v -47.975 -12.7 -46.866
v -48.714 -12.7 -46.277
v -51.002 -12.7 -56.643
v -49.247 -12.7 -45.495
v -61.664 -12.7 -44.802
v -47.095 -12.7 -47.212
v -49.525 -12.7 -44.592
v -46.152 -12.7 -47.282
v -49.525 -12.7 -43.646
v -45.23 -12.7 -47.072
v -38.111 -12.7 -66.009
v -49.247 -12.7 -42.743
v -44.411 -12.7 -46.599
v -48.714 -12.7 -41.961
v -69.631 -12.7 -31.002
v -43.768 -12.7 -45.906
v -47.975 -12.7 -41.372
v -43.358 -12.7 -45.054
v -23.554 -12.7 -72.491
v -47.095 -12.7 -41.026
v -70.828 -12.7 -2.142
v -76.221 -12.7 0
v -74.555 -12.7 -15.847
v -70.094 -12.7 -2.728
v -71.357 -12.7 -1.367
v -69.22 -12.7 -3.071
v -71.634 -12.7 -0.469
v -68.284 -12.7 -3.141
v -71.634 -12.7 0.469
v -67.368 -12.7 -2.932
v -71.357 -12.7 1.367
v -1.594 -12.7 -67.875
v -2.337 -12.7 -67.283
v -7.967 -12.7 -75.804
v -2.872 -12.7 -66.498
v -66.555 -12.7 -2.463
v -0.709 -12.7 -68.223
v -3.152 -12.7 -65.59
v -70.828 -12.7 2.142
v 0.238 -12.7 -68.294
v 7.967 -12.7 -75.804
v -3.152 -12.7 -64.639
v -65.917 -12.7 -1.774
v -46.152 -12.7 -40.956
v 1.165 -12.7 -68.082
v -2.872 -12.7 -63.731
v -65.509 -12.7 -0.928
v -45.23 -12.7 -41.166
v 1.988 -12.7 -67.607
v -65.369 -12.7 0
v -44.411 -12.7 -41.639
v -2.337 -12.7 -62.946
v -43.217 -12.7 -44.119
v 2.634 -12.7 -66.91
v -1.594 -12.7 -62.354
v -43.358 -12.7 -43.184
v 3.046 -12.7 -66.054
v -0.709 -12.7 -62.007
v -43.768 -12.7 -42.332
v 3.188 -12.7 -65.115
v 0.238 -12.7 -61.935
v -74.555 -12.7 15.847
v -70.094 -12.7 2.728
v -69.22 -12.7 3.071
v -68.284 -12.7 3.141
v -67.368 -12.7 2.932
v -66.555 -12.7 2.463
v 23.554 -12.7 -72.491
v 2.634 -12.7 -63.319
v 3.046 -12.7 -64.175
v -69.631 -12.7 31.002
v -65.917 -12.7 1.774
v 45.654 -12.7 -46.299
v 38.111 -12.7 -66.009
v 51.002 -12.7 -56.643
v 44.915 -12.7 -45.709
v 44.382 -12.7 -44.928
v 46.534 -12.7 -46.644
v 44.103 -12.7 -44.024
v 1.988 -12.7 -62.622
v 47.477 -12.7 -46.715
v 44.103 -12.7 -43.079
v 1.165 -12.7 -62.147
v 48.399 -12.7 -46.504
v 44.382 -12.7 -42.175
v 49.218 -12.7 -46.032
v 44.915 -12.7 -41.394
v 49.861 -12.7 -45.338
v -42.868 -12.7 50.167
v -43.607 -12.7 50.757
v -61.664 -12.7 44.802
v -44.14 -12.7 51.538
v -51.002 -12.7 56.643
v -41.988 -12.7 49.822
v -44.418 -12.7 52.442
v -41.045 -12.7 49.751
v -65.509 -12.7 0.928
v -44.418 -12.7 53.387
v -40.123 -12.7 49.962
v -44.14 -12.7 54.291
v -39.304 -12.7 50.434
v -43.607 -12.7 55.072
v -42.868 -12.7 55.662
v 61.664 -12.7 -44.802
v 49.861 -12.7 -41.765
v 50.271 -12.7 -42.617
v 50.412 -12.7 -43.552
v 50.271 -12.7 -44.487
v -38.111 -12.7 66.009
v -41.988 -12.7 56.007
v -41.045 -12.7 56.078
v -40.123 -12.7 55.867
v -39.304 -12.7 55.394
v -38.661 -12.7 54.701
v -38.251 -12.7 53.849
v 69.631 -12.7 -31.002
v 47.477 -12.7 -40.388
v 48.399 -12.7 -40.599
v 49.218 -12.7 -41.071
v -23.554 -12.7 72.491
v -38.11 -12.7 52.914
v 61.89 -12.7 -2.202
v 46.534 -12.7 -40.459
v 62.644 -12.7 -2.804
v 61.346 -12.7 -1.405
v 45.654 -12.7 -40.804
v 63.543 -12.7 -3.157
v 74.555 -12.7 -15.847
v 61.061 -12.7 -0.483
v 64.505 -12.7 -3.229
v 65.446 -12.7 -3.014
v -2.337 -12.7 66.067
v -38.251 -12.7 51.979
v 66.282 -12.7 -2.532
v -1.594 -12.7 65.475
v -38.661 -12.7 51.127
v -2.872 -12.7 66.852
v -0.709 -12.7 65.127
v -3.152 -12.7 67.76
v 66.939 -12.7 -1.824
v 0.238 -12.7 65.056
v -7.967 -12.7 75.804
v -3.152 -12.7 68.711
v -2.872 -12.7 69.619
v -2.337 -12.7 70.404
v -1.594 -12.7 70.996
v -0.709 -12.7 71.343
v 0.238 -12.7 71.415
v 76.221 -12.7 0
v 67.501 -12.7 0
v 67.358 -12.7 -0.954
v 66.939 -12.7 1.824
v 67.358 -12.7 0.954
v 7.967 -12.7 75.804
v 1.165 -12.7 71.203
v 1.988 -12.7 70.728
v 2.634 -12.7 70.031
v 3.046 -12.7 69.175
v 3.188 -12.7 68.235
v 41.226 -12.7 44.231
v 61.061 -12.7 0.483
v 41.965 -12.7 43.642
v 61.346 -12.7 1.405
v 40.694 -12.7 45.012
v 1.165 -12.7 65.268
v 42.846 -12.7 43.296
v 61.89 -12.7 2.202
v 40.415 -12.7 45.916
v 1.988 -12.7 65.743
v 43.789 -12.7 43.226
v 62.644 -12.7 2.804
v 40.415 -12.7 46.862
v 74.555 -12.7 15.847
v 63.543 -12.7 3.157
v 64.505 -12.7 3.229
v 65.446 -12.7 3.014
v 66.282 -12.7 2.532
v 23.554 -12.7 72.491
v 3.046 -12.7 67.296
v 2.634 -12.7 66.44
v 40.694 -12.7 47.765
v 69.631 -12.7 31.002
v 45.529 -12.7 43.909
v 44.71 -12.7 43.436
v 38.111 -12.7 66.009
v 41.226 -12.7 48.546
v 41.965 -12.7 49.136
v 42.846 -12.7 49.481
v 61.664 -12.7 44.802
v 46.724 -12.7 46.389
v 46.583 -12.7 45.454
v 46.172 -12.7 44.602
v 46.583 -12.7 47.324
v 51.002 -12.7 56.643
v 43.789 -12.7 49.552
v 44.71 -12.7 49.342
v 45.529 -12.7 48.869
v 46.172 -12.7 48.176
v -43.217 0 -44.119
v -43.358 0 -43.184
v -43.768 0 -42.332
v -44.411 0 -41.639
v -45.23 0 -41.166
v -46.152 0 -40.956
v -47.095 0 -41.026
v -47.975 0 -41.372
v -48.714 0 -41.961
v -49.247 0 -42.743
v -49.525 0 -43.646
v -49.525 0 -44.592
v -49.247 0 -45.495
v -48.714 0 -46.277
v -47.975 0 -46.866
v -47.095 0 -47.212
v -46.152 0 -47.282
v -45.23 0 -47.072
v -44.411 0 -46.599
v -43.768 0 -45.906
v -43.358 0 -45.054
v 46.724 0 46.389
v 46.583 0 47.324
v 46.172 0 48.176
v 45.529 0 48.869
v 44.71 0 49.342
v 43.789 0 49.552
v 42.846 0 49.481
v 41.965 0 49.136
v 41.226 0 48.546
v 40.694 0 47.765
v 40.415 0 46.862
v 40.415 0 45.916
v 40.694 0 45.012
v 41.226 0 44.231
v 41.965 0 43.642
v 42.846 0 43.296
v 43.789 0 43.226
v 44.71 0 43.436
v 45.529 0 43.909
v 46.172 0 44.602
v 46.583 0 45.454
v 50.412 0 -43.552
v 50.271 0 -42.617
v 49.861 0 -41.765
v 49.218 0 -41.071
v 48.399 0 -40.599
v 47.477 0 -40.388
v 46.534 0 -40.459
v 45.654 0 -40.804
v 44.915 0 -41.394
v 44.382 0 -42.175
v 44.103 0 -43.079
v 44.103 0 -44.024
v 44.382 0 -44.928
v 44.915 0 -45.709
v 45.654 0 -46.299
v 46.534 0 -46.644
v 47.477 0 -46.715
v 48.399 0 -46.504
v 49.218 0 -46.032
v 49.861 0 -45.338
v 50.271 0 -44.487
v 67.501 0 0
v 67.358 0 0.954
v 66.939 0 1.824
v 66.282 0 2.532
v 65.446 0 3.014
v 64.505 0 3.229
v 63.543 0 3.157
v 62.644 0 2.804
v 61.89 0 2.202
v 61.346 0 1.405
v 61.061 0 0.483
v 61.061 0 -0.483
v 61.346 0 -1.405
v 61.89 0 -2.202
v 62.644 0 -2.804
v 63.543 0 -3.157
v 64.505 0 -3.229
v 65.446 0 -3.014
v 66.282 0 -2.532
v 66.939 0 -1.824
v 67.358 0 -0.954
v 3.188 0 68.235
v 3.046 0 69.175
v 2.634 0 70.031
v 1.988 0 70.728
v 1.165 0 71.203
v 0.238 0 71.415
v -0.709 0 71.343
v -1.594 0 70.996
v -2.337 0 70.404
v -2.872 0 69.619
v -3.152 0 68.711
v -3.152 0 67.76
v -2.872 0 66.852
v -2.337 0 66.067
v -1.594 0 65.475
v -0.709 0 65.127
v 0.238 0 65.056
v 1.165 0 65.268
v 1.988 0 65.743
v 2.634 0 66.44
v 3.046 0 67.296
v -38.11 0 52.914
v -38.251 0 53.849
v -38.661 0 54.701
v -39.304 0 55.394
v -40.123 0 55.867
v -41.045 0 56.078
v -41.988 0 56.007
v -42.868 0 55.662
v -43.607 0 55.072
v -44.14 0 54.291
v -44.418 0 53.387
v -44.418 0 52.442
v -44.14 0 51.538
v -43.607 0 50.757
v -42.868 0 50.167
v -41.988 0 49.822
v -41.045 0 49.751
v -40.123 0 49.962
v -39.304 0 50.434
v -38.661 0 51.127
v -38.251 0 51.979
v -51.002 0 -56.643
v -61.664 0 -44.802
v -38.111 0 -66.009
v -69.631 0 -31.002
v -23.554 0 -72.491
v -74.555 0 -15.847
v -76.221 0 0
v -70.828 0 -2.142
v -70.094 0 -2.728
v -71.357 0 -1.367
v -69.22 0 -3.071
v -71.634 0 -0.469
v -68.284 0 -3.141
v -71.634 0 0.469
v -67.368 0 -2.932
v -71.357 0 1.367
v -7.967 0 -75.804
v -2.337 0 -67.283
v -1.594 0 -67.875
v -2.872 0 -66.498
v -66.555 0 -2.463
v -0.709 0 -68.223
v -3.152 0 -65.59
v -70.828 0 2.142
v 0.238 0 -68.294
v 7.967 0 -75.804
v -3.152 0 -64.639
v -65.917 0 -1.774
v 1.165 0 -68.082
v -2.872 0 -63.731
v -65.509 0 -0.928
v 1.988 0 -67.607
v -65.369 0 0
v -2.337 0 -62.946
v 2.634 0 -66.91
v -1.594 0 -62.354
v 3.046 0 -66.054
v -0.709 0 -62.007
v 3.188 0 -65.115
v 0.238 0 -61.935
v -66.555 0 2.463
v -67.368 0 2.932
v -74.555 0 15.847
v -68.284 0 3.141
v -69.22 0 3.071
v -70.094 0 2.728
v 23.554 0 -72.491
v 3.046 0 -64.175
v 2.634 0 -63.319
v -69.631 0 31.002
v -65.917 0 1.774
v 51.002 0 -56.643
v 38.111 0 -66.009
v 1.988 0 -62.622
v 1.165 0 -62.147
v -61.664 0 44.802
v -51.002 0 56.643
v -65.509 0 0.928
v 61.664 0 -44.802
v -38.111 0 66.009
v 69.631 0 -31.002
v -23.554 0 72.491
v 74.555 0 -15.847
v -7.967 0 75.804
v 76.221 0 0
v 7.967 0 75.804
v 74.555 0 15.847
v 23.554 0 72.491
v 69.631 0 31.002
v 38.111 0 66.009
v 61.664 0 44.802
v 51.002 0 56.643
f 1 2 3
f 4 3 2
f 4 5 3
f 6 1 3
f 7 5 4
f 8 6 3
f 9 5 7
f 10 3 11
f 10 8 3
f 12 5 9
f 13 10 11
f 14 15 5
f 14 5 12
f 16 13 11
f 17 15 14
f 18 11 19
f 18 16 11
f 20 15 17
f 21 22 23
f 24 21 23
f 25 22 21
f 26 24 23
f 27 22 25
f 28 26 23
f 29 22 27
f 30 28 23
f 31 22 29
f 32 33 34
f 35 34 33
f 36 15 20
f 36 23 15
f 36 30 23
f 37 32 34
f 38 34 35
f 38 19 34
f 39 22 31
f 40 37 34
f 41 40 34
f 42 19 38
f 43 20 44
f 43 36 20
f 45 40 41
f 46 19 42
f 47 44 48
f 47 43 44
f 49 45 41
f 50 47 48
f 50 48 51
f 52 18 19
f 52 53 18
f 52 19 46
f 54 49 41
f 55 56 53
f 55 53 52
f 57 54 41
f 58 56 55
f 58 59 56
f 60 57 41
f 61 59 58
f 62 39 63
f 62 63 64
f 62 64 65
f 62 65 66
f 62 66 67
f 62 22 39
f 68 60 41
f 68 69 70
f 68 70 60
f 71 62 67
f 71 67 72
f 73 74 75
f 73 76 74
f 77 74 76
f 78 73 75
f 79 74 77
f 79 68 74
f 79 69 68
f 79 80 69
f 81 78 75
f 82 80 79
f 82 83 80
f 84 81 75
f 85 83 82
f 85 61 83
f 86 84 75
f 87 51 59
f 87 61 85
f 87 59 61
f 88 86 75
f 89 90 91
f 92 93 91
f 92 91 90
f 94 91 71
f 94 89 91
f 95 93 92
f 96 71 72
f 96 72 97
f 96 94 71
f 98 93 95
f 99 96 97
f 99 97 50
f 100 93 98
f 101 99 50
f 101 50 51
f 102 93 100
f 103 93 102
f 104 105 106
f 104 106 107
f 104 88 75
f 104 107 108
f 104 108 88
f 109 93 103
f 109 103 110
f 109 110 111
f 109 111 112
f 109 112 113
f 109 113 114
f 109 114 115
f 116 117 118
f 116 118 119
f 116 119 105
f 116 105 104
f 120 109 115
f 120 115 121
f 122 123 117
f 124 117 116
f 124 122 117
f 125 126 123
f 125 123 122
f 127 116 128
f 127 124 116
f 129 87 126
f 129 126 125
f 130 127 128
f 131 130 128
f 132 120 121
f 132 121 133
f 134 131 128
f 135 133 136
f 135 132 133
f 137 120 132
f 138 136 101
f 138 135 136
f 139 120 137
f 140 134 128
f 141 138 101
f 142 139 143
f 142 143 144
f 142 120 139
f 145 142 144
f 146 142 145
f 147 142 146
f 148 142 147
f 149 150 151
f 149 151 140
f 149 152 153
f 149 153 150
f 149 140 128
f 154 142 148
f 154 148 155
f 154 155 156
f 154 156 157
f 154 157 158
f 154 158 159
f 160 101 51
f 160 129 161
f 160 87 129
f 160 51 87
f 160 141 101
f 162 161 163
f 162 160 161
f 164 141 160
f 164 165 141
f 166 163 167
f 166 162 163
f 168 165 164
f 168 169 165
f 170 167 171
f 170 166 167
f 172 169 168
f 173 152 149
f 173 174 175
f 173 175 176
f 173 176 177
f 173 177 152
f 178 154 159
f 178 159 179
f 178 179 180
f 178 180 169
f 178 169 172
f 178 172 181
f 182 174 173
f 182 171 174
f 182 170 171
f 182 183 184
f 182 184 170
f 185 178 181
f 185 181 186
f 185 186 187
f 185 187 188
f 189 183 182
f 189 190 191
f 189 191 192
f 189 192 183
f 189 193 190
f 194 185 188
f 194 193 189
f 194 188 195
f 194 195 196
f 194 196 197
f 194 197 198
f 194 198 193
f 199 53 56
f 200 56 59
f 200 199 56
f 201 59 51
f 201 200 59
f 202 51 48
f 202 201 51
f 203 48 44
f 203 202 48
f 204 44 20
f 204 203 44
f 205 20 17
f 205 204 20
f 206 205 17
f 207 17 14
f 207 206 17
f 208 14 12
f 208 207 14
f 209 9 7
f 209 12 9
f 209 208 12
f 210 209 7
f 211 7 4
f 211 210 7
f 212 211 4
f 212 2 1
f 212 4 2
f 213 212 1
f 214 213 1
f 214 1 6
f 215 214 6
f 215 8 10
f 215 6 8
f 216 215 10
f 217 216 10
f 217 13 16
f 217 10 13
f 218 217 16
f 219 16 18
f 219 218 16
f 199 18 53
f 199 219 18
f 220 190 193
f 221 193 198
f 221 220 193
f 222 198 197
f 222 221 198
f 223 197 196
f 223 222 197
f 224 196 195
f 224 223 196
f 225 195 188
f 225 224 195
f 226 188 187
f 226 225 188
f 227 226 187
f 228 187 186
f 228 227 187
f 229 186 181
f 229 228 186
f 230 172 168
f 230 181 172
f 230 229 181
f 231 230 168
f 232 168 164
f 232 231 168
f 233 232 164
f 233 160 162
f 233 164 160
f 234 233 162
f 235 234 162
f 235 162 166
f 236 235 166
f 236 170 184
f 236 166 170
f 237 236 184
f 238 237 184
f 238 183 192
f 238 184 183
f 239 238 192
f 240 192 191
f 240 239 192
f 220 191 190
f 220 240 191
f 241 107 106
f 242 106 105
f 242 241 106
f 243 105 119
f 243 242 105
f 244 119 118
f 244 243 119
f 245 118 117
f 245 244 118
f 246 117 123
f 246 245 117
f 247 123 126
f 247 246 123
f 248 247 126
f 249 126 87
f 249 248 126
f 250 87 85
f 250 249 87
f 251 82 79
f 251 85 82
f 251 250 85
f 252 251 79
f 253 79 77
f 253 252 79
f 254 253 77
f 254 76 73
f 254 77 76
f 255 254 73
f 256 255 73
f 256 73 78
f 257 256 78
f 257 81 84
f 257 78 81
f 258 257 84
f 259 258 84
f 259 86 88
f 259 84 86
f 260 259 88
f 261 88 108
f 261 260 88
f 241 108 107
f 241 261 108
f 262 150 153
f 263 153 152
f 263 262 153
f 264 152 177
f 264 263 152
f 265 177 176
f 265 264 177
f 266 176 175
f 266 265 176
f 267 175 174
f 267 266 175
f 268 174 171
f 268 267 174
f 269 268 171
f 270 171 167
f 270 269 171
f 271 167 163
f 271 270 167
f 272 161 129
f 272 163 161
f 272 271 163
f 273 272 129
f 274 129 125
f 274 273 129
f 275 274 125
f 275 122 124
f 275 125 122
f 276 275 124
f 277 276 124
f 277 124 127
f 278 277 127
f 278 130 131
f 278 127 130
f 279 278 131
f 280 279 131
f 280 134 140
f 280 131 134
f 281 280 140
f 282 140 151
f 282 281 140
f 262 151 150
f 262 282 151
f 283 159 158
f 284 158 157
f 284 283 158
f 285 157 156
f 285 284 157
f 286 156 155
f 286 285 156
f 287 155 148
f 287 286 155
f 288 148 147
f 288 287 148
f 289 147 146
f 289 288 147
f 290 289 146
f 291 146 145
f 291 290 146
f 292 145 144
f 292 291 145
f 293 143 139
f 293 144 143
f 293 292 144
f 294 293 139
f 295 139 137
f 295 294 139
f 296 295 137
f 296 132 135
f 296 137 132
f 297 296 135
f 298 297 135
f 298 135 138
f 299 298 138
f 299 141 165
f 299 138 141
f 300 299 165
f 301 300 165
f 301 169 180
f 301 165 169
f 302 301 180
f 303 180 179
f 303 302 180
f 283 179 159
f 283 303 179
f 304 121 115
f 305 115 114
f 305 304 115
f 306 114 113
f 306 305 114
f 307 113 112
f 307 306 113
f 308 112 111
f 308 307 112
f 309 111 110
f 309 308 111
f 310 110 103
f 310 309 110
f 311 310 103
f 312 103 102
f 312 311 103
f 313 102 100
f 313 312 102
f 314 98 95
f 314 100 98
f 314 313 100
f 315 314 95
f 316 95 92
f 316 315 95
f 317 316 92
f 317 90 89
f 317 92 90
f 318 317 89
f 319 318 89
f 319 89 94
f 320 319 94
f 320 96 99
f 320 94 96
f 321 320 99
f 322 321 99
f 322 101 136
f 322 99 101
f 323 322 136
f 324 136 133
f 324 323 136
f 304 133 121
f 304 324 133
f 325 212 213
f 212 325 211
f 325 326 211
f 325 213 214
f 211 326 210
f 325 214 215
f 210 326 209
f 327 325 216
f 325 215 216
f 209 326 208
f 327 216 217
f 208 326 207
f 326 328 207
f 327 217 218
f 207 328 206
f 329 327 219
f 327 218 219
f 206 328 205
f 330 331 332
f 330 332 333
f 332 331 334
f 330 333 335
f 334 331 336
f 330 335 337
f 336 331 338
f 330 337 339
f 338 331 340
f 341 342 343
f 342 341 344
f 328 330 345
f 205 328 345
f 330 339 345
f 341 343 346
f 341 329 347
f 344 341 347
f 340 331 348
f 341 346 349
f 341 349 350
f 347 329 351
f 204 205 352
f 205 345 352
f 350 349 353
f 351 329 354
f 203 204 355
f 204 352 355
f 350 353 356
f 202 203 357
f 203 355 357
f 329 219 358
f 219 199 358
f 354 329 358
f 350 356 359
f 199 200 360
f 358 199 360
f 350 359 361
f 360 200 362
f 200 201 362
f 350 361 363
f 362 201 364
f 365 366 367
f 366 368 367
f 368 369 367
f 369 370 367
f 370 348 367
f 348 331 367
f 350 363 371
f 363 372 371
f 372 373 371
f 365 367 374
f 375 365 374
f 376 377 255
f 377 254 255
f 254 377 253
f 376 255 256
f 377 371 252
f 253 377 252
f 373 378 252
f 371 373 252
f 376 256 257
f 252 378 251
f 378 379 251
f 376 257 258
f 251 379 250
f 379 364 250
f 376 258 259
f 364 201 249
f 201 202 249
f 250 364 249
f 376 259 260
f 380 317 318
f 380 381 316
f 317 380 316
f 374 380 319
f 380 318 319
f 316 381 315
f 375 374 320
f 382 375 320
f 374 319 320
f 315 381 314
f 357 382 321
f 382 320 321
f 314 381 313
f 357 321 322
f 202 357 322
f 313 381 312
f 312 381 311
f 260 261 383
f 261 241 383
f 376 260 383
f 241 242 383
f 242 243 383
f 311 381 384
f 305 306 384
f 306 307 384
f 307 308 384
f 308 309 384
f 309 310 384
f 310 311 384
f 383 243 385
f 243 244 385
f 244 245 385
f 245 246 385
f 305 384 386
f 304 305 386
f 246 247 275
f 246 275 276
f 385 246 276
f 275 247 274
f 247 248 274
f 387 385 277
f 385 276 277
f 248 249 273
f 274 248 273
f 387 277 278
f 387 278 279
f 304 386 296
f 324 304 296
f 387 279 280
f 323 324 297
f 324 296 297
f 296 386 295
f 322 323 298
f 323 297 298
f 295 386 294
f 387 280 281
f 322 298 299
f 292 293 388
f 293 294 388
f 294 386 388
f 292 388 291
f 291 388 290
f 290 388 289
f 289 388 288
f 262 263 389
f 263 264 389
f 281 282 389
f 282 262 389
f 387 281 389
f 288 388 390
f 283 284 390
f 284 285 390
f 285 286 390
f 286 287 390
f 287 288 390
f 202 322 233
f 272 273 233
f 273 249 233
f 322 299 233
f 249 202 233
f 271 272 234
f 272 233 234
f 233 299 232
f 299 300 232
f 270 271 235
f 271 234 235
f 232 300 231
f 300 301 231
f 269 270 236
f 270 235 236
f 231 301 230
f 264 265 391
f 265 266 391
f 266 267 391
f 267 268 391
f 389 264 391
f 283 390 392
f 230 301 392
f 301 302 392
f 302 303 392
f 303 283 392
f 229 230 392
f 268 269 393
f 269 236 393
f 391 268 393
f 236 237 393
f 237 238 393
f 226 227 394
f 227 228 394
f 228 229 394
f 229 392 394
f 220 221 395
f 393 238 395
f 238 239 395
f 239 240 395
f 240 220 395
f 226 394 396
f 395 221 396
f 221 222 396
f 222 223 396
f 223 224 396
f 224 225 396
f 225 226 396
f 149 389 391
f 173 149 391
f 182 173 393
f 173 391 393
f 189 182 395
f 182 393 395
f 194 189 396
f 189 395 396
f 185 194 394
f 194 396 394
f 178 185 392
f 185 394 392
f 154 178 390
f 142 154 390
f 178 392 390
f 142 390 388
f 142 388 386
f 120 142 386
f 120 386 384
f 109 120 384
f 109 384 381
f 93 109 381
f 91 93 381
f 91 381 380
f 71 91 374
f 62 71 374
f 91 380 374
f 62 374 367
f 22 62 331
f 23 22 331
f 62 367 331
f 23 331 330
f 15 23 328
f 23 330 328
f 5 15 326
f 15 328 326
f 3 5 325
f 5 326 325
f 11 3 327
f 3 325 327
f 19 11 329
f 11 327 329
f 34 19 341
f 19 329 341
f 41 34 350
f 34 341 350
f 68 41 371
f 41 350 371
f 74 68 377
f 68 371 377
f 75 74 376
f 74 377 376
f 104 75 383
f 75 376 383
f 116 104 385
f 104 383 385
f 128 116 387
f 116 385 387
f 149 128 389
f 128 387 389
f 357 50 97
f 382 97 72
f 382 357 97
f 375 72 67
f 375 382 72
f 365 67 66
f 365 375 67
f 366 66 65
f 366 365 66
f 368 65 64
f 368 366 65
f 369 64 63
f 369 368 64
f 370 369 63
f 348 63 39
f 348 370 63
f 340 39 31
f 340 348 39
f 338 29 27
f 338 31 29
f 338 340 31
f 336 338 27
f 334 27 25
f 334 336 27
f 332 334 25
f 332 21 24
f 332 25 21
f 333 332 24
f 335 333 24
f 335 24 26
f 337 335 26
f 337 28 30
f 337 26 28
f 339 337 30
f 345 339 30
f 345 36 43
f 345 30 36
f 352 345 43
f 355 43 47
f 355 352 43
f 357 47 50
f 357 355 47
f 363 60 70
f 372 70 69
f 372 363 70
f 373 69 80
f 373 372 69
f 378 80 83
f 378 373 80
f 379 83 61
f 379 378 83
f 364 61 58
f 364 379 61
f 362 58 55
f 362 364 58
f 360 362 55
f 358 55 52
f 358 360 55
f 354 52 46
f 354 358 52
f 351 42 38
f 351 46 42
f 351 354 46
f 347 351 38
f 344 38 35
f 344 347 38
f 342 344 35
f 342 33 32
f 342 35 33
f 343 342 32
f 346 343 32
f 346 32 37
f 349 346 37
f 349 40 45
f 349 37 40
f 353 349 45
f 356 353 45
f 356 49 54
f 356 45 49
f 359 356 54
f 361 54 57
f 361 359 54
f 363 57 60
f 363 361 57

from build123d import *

# Parameters (mm, degrees)
F0_R     = 76.2210632732
F1_DEPTH = 12.7
F2_R     = 3.1879491609
F2_R_2   = 3.1879465914
F2_R_3   = 3.2380529084
F2_R_4   = 3.1498446293
F2_R_5   = 3.1721232023
F2_R_6   = 3.1721218695
F2_R_7   = 3.1721255347
F2_R_8   = 3.1721262011
F3_DEPTH = 25.4


# Not quite as in the source:
# - a length typed as a fraction of an inch, garbled in the dataset ("3 / 203.2 mm" for 3/8 in), is restored


with BuildPart() as f1:
    # F0 (on Front) → F1 (new body)
    with BuildSketch(Plane.XZ):
        Circle(F0_R)
    extrude(amount=F1_DEPTH)

    # F2 (on Front) → F3 (cut)
    with BuildSketch(Plane.XZ):
        with Locations((0, 68.2354792953)):
            Circle(F2_R)
        with Locations((0, -65.1145204902)):
            Circle(F2_R_2)
        with Locations((64.2633512616, 0)):
            Circle(F2_R_3)
        with Locations((-68.519204855, 0)):
            Circle(F2_R_4)
        with Locations((-41.2817560136, 52.9144145548)):
            Circle(F2_R_5)
        with Locations((47.2399480641, -43.5515418649)):
            Circle(F2_R_6)
        with Locations((-46.3887788355, -44.118989259)):
            Circle(F2_R_7)
        with Locations((43.5515418649, 46.3887788355)):
            Circle(F2_R_8)
    extrude(amount=F3_DEPTH, mode=Mode.SUBTRACT)


solid = f1.part
